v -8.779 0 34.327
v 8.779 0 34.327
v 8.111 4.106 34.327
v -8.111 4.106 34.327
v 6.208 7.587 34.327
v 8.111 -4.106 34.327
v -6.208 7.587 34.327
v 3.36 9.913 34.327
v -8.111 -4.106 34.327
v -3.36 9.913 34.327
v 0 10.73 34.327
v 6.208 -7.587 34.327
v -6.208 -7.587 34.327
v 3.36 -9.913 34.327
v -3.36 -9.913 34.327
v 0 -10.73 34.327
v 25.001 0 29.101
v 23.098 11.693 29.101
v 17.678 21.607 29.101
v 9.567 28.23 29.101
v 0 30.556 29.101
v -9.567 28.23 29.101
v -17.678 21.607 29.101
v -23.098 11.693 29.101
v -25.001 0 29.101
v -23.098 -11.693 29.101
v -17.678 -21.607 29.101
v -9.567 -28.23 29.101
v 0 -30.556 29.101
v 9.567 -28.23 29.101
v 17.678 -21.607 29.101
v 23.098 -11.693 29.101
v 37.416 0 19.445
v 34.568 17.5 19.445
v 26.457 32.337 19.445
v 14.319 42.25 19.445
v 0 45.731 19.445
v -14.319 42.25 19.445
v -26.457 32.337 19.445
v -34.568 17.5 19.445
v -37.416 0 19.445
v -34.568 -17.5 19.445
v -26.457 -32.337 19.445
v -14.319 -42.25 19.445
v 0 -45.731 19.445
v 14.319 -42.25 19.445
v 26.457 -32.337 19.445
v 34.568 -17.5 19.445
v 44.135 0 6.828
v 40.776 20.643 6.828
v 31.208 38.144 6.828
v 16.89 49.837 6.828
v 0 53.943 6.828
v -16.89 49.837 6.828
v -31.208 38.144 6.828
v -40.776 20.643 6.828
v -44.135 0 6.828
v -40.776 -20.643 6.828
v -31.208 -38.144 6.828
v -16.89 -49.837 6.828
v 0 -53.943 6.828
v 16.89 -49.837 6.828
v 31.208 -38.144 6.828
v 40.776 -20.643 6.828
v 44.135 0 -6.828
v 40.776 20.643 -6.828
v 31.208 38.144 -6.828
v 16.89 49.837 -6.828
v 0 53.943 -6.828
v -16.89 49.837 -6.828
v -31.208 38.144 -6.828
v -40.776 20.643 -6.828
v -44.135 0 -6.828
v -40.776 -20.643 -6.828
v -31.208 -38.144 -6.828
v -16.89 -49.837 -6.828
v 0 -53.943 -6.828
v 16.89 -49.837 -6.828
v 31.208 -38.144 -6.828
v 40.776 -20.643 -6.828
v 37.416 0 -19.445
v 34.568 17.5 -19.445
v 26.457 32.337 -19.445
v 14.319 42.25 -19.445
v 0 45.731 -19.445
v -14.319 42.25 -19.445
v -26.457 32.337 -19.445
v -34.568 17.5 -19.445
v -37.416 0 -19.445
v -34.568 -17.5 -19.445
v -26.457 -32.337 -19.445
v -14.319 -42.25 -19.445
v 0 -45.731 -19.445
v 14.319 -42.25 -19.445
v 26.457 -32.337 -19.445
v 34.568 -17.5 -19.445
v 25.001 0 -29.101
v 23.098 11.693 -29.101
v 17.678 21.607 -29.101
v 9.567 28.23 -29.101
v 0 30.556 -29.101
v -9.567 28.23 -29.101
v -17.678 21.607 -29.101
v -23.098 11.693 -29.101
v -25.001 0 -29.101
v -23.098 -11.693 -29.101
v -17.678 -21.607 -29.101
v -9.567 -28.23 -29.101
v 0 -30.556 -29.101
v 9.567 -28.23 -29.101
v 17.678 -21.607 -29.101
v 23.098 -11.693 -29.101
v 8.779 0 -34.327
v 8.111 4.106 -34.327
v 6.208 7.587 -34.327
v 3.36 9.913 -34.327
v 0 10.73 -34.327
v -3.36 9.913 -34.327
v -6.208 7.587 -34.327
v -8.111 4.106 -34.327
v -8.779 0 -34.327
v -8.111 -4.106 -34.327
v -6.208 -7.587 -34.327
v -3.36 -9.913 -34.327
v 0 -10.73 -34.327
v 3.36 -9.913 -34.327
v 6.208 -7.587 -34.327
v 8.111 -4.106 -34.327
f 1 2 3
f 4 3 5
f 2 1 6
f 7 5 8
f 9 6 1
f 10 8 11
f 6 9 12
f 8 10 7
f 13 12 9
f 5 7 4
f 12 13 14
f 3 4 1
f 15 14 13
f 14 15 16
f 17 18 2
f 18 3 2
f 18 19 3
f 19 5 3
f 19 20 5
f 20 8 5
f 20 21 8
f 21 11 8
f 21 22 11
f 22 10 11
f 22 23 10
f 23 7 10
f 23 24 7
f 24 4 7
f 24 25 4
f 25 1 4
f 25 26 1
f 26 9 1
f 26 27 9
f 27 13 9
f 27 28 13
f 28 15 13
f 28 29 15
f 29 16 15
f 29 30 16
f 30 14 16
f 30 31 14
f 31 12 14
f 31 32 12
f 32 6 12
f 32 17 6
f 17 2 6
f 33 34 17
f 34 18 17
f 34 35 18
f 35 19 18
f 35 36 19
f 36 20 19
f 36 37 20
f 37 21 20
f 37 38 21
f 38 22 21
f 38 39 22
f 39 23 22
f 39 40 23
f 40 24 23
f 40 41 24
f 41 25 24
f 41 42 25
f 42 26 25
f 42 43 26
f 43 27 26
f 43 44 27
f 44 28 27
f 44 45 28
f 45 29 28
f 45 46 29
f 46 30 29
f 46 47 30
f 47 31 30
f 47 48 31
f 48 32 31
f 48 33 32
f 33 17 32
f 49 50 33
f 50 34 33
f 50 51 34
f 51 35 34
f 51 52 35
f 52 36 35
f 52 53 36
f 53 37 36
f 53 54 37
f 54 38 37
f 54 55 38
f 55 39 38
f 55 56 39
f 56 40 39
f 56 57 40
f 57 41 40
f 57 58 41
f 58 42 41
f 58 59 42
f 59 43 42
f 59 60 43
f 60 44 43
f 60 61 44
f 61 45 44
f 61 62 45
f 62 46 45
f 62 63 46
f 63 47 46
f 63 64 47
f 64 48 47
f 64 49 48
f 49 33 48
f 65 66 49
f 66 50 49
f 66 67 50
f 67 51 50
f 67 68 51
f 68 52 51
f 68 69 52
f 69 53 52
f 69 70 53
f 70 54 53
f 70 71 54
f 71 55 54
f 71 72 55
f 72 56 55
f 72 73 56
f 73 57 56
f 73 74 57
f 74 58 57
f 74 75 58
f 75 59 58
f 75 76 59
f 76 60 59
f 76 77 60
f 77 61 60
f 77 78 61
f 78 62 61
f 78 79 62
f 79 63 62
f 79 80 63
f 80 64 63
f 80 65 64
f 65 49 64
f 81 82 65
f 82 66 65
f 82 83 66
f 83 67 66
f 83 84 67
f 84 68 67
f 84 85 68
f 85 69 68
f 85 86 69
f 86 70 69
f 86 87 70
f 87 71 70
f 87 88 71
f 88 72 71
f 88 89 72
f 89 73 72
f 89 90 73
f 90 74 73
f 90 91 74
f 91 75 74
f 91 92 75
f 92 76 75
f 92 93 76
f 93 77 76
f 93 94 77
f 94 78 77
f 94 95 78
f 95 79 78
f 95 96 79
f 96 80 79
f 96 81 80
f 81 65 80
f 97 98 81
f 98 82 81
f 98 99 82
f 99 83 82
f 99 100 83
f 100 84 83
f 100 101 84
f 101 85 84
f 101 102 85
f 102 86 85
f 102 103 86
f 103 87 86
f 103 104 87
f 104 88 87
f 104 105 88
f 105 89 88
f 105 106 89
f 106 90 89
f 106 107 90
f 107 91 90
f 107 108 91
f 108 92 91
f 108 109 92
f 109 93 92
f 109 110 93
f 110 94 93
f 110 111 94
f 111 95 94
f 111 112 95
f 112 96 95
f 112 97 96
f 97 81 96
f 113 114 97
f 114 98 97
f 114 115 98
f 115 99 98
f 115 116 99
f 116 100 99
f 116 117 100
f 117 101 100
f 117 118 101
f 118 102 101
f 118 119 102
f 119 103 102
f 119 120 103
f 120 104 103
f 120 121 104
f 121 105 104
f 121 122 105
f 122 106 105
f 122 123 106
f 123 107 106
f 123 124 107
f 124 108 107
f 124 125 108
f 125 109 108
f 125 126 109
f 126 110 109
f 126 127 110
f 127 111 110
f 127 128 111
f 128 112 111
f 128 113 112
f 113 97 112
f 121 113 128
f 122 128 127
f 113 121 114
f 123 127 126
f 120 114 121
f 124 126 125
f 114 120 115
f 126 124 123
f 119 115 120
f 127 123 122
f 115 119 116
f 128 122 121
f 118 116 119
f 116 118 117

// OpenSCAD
// Generated by SolidPython 1.0.1 on 2020-07-29 00:46:48


scale(v = [9, 11, 7]) {
	sphere(r = 5);
}
/***********************************************
*********      SolidPython code:      **********
************************************************
 
# import packages: SolidPython
from solid import *
from solid.utils import *
from itertools import chain, combinations, permutations


class Resize:

    def __init__(self, scad_file):
        self.scad_file = scad_file
        #self.scad_file = import_scad(scad_file)
        # cone/cylinder param:
        self.r1 = 0
        self.r2 = 0
        self.h = 0
        # rectangular prism param:
        self.w = 0
        self.l = 0
        # ellipse param:
        self.r = 0

    # import OpenScad code (file name corresponds to shape)


    # classify shape + parameters
    def assign(self, param1, param2, param3):
        if self.scad_file == 'cone.scad':
            self.r1 = param1
            self.r2 = param2
            self.h = param3
        elif self.scad_file == 'cylinder.scad':
            self.r1 = param1
            self.r2 = param2
            self.h = param3
        elif self.scad_file == 'rectangularPrism.scad':
            self.h = param1
            self.l = param2
            self.w = param3
        else:
            self.r = param1
            self.h = param2

    # resize parameters
    def iterate(self):
        x = range(3, 20, 2)
        i = 1
        if self.scad_file == 'cone.scad':
            tempList = list(permutations(x, 2))
            for temp in tempList:
                param1 = temp[0]
                param2 = temp[1]
                filepath = 'produced_scad_files/' + 'cone' + str(param1) + '_' + str(param2) + '_' + '.scad'
                scad_render_to_file(cylinder(h=param1, r1=param2, r2=0), filepath)

        elif self.scad_file == 'cylinder.scad':
            tempList = list(permutations(x, 3))
            for temp in tempList:
                param1 = temp[0]
                param2 = temp[1]
                filepath = 'produced_scad_files/' + 'cylinder' + str(param1) + '_' + str(param2) + '_' + '.scad'
                scad_render_to_file(cylinder(h=param1, r1=param2, r2=param2), filepath)

        elif self.scad_file == 'rectangularPrism.scad':
            tempList = list(permutations(x, 3))
            for temp in tempList:
                param1 = temp[0]
                param2 = temp[1]
                param3 = temp[2]
                filepath = 'produced_scad_files/' + 'rectangularPrism' + str(param1) + '_' + str(param2) + '_' + str(
                    param3) + '.scad'
                scad_render_to_file(cube(size=(param1, param2, param3)), filepath)

        elif self.scad_file == 'ellipse.scad':
            tempList = list(permutations(x, 4))
            for temp in tempList:
                param1 = temp[0]
                param2 = temp[1]
                param3 = temp[2]
                param4 = temp[3]
                filepath = 'produced_scad_files/' + 'ellipse' + str(param1) + '_' + str(param2) + '_' + str(param3) + '_' + str(param4) + '.scad'
                scad_render_to_file(scale([param1, param2, param3])(sphere(r=param4)), filepath)

    def render_to_scadfile(self):
        scad_render_to_file(scad, 'example.scad') 
 
************************************************/
